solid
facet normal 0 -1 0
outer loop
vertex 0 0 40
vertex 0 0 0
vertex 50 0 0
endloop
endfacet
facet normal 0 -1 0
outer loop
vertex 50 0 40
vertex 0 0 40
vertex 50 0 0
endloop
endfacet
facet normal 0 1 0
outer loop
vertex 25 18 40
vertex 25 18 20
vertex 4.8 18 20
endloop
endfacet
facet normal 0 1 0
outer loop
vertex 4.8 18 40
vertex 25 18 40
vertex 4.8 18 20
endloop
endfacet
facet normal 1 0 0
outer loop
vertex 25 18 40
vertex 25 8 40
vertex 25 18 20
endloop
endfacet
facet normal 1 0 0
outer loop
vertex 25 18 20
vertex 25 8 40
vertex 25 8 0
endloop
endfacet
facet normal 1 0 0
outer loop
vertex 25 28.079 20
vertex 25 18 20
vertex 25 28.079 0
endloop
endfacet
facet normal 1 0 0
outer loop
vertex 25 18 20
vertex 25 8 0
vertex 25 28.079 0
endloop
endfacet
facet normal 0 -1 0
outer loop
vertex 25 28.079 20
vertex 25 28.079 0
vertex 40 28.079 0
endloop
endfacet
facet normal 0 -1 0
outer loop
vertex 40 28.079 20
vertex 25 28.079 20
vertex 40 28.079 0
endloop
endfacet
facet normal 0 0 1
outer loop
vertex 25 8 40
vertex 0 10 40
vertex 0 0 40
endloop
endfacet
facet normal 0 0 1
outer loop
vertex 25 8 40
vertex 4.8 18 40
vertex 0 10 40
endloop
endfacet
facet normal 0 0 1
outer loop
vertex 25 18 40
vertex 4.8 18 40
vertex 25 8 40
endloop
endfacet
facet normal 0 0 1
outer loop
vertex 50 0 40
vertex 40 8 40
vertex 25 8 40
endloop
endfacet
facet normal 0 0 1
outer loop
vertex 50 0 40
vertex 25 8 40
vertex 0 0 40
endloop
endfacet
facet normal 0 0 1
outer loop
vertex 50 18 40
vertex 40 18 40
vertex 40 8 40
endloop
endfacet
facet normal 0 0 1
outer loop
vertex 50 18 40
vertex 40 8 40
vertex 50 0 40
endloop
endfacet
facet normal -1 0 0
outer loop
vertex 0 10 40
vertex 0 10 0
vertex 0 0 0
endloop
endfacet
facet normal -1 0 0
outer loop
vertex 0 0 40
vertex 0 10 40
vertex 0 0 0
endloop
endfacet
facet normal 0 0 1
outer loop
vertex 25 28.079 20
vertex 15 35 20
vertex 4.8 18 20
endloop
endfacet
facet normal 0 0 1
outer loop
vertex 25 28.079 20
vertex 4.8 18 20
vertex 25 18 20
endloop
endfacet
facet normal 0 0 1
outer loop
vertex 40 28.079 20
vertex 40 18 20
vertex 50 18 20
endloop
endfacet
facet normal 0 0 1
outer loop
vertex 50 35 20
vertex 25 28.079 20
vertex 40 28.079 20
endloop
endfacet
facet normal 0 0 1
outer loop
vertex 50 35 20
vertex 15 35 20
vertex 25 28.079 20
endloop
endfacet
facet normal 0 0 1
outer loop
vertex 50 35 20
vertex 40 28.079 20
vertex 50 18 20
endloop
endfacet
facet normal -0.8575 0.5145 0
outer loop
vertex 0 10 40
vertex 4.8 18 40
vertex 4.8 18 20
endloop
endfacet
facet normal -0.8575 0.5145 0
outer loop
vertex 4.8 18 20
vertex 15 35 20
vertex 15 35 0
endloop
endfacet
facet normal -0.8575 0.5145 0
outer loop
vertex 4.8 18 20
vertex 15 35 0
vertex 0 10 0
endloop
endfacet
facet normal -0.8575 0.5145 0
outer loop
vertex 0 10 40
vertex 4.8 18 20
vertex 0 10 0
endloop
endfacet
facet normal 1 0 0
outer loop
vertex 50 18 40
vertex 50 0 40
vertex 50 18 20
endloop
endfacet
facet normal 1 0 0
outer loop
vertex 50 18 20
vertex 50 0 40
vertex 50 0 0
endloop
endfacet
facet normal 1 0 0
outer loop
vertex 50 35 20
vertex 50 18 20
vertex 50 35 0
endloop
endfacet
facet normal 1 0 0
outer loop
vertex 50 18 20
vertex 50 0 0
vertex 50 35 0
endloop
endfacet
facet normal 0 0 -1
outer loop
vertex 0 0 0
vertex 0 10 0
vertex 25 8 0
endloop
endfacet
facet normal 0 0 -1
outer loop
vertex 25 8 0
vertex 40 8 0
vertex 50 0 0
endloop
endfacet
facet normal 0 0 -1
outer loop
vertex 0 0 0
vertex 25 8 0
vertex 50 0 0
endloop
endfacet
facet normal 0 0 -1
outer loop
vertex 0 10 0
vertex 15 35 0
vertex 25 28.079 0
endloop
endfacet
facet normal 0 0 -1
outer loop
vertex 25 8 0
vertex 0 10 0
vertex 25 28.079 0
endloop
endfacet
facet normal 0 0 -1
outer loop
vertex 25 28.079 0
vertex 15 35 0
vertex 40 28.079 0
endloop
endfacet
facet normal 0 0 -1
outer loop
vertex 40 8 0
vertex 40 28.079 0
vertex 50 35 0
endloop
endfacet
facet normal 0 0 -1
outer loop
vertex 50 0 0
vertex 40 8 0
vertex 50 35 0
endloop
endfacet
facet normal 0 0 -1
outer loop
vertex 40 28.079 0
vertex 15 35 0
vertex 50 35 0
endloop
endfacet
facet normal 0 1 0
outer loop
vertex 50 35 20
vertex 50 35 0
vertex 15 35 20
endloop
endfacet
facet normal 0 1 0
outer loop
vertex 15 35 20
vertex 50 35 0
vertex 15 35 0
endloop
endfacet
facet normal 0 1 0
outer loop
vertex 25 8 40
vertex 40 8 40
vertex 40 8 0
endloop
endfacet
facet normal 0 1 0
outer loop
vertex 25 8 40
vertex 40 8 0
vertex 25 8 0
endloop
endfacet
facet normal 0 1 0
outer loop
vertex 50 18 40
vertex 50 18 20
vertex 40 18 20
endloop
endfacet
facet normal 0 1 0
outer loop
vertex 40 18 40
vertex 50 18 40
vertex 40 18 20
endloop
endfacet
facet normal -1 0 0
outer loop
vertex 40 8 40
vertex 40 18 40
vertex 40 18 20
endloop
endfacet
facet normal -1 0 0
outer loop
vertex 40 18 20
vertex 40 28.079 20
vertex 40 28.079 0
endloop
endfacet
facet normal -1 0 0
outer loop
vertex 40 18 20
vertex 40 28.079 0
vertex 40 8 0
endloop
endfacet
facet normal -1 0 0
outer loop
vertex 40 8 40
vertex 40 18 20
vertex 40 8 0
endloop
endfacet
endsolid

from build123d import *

# Parameters (mm, degrees)
BOSS_EXTRUDE1_DEPTH = 40
BOSS_EXTRUDE2_DEPTH = 20


with BuildPart() as part:
    # Sketch1 → Boss-Extrude1 (new body)
    with BuildSketch(Plane.XY):
        Polygon((0, 10), (0, 0), (50, 0), (50, 18), (40, 18), (40, 8), (25, 8), (25, 18), (4.8, 18), align=None)
    extrude(amount=BOSS_EXTRUDE1_DEPTH)

    # Sketch1<3> → Boss-Extrude2 (add)
    with BuildSketch(Plane.XY):
        Polygon((40, 18), (50, 18), (50, 35), (15, 35), (4.8, 18), (25, 18), (25, 28.078689743), (40, 28.078689743), align=None)
    extrude(amount=BOSS_EXTRUDE2_DEPTH)


solid = part.part
